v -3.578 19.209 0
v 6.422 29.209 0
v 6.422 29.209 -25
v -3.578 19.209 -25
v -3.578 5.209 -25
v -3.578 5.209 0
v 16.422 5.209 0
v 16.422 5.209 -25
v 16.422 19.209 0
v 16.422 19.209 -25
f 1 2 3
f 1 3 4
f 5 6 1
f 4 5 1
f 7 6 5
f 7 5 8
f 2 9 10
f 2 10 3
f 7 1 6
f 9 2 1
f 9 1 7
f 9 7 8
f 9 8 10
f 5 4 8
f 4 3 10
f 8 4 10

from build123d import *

# Parameters (mm, degrees)
F0_W     = 20
F0_H     = 14
F1_DEPTH = 25


with BuildPart() as f1:
    # F0 (on Top) → F1 (new body)
    with BuildSketch(Plane.XY):
        with Locations((6.421969, 12.208542)):
            Rectangle(F0_W, F0_H)
        Polygon((6.421969, 29.208542), (-3.578031, 19.208542), (16.421969, 19.208542), align=None)
    extrude(amount=-F1_DEPTH)


solid = f1.part
